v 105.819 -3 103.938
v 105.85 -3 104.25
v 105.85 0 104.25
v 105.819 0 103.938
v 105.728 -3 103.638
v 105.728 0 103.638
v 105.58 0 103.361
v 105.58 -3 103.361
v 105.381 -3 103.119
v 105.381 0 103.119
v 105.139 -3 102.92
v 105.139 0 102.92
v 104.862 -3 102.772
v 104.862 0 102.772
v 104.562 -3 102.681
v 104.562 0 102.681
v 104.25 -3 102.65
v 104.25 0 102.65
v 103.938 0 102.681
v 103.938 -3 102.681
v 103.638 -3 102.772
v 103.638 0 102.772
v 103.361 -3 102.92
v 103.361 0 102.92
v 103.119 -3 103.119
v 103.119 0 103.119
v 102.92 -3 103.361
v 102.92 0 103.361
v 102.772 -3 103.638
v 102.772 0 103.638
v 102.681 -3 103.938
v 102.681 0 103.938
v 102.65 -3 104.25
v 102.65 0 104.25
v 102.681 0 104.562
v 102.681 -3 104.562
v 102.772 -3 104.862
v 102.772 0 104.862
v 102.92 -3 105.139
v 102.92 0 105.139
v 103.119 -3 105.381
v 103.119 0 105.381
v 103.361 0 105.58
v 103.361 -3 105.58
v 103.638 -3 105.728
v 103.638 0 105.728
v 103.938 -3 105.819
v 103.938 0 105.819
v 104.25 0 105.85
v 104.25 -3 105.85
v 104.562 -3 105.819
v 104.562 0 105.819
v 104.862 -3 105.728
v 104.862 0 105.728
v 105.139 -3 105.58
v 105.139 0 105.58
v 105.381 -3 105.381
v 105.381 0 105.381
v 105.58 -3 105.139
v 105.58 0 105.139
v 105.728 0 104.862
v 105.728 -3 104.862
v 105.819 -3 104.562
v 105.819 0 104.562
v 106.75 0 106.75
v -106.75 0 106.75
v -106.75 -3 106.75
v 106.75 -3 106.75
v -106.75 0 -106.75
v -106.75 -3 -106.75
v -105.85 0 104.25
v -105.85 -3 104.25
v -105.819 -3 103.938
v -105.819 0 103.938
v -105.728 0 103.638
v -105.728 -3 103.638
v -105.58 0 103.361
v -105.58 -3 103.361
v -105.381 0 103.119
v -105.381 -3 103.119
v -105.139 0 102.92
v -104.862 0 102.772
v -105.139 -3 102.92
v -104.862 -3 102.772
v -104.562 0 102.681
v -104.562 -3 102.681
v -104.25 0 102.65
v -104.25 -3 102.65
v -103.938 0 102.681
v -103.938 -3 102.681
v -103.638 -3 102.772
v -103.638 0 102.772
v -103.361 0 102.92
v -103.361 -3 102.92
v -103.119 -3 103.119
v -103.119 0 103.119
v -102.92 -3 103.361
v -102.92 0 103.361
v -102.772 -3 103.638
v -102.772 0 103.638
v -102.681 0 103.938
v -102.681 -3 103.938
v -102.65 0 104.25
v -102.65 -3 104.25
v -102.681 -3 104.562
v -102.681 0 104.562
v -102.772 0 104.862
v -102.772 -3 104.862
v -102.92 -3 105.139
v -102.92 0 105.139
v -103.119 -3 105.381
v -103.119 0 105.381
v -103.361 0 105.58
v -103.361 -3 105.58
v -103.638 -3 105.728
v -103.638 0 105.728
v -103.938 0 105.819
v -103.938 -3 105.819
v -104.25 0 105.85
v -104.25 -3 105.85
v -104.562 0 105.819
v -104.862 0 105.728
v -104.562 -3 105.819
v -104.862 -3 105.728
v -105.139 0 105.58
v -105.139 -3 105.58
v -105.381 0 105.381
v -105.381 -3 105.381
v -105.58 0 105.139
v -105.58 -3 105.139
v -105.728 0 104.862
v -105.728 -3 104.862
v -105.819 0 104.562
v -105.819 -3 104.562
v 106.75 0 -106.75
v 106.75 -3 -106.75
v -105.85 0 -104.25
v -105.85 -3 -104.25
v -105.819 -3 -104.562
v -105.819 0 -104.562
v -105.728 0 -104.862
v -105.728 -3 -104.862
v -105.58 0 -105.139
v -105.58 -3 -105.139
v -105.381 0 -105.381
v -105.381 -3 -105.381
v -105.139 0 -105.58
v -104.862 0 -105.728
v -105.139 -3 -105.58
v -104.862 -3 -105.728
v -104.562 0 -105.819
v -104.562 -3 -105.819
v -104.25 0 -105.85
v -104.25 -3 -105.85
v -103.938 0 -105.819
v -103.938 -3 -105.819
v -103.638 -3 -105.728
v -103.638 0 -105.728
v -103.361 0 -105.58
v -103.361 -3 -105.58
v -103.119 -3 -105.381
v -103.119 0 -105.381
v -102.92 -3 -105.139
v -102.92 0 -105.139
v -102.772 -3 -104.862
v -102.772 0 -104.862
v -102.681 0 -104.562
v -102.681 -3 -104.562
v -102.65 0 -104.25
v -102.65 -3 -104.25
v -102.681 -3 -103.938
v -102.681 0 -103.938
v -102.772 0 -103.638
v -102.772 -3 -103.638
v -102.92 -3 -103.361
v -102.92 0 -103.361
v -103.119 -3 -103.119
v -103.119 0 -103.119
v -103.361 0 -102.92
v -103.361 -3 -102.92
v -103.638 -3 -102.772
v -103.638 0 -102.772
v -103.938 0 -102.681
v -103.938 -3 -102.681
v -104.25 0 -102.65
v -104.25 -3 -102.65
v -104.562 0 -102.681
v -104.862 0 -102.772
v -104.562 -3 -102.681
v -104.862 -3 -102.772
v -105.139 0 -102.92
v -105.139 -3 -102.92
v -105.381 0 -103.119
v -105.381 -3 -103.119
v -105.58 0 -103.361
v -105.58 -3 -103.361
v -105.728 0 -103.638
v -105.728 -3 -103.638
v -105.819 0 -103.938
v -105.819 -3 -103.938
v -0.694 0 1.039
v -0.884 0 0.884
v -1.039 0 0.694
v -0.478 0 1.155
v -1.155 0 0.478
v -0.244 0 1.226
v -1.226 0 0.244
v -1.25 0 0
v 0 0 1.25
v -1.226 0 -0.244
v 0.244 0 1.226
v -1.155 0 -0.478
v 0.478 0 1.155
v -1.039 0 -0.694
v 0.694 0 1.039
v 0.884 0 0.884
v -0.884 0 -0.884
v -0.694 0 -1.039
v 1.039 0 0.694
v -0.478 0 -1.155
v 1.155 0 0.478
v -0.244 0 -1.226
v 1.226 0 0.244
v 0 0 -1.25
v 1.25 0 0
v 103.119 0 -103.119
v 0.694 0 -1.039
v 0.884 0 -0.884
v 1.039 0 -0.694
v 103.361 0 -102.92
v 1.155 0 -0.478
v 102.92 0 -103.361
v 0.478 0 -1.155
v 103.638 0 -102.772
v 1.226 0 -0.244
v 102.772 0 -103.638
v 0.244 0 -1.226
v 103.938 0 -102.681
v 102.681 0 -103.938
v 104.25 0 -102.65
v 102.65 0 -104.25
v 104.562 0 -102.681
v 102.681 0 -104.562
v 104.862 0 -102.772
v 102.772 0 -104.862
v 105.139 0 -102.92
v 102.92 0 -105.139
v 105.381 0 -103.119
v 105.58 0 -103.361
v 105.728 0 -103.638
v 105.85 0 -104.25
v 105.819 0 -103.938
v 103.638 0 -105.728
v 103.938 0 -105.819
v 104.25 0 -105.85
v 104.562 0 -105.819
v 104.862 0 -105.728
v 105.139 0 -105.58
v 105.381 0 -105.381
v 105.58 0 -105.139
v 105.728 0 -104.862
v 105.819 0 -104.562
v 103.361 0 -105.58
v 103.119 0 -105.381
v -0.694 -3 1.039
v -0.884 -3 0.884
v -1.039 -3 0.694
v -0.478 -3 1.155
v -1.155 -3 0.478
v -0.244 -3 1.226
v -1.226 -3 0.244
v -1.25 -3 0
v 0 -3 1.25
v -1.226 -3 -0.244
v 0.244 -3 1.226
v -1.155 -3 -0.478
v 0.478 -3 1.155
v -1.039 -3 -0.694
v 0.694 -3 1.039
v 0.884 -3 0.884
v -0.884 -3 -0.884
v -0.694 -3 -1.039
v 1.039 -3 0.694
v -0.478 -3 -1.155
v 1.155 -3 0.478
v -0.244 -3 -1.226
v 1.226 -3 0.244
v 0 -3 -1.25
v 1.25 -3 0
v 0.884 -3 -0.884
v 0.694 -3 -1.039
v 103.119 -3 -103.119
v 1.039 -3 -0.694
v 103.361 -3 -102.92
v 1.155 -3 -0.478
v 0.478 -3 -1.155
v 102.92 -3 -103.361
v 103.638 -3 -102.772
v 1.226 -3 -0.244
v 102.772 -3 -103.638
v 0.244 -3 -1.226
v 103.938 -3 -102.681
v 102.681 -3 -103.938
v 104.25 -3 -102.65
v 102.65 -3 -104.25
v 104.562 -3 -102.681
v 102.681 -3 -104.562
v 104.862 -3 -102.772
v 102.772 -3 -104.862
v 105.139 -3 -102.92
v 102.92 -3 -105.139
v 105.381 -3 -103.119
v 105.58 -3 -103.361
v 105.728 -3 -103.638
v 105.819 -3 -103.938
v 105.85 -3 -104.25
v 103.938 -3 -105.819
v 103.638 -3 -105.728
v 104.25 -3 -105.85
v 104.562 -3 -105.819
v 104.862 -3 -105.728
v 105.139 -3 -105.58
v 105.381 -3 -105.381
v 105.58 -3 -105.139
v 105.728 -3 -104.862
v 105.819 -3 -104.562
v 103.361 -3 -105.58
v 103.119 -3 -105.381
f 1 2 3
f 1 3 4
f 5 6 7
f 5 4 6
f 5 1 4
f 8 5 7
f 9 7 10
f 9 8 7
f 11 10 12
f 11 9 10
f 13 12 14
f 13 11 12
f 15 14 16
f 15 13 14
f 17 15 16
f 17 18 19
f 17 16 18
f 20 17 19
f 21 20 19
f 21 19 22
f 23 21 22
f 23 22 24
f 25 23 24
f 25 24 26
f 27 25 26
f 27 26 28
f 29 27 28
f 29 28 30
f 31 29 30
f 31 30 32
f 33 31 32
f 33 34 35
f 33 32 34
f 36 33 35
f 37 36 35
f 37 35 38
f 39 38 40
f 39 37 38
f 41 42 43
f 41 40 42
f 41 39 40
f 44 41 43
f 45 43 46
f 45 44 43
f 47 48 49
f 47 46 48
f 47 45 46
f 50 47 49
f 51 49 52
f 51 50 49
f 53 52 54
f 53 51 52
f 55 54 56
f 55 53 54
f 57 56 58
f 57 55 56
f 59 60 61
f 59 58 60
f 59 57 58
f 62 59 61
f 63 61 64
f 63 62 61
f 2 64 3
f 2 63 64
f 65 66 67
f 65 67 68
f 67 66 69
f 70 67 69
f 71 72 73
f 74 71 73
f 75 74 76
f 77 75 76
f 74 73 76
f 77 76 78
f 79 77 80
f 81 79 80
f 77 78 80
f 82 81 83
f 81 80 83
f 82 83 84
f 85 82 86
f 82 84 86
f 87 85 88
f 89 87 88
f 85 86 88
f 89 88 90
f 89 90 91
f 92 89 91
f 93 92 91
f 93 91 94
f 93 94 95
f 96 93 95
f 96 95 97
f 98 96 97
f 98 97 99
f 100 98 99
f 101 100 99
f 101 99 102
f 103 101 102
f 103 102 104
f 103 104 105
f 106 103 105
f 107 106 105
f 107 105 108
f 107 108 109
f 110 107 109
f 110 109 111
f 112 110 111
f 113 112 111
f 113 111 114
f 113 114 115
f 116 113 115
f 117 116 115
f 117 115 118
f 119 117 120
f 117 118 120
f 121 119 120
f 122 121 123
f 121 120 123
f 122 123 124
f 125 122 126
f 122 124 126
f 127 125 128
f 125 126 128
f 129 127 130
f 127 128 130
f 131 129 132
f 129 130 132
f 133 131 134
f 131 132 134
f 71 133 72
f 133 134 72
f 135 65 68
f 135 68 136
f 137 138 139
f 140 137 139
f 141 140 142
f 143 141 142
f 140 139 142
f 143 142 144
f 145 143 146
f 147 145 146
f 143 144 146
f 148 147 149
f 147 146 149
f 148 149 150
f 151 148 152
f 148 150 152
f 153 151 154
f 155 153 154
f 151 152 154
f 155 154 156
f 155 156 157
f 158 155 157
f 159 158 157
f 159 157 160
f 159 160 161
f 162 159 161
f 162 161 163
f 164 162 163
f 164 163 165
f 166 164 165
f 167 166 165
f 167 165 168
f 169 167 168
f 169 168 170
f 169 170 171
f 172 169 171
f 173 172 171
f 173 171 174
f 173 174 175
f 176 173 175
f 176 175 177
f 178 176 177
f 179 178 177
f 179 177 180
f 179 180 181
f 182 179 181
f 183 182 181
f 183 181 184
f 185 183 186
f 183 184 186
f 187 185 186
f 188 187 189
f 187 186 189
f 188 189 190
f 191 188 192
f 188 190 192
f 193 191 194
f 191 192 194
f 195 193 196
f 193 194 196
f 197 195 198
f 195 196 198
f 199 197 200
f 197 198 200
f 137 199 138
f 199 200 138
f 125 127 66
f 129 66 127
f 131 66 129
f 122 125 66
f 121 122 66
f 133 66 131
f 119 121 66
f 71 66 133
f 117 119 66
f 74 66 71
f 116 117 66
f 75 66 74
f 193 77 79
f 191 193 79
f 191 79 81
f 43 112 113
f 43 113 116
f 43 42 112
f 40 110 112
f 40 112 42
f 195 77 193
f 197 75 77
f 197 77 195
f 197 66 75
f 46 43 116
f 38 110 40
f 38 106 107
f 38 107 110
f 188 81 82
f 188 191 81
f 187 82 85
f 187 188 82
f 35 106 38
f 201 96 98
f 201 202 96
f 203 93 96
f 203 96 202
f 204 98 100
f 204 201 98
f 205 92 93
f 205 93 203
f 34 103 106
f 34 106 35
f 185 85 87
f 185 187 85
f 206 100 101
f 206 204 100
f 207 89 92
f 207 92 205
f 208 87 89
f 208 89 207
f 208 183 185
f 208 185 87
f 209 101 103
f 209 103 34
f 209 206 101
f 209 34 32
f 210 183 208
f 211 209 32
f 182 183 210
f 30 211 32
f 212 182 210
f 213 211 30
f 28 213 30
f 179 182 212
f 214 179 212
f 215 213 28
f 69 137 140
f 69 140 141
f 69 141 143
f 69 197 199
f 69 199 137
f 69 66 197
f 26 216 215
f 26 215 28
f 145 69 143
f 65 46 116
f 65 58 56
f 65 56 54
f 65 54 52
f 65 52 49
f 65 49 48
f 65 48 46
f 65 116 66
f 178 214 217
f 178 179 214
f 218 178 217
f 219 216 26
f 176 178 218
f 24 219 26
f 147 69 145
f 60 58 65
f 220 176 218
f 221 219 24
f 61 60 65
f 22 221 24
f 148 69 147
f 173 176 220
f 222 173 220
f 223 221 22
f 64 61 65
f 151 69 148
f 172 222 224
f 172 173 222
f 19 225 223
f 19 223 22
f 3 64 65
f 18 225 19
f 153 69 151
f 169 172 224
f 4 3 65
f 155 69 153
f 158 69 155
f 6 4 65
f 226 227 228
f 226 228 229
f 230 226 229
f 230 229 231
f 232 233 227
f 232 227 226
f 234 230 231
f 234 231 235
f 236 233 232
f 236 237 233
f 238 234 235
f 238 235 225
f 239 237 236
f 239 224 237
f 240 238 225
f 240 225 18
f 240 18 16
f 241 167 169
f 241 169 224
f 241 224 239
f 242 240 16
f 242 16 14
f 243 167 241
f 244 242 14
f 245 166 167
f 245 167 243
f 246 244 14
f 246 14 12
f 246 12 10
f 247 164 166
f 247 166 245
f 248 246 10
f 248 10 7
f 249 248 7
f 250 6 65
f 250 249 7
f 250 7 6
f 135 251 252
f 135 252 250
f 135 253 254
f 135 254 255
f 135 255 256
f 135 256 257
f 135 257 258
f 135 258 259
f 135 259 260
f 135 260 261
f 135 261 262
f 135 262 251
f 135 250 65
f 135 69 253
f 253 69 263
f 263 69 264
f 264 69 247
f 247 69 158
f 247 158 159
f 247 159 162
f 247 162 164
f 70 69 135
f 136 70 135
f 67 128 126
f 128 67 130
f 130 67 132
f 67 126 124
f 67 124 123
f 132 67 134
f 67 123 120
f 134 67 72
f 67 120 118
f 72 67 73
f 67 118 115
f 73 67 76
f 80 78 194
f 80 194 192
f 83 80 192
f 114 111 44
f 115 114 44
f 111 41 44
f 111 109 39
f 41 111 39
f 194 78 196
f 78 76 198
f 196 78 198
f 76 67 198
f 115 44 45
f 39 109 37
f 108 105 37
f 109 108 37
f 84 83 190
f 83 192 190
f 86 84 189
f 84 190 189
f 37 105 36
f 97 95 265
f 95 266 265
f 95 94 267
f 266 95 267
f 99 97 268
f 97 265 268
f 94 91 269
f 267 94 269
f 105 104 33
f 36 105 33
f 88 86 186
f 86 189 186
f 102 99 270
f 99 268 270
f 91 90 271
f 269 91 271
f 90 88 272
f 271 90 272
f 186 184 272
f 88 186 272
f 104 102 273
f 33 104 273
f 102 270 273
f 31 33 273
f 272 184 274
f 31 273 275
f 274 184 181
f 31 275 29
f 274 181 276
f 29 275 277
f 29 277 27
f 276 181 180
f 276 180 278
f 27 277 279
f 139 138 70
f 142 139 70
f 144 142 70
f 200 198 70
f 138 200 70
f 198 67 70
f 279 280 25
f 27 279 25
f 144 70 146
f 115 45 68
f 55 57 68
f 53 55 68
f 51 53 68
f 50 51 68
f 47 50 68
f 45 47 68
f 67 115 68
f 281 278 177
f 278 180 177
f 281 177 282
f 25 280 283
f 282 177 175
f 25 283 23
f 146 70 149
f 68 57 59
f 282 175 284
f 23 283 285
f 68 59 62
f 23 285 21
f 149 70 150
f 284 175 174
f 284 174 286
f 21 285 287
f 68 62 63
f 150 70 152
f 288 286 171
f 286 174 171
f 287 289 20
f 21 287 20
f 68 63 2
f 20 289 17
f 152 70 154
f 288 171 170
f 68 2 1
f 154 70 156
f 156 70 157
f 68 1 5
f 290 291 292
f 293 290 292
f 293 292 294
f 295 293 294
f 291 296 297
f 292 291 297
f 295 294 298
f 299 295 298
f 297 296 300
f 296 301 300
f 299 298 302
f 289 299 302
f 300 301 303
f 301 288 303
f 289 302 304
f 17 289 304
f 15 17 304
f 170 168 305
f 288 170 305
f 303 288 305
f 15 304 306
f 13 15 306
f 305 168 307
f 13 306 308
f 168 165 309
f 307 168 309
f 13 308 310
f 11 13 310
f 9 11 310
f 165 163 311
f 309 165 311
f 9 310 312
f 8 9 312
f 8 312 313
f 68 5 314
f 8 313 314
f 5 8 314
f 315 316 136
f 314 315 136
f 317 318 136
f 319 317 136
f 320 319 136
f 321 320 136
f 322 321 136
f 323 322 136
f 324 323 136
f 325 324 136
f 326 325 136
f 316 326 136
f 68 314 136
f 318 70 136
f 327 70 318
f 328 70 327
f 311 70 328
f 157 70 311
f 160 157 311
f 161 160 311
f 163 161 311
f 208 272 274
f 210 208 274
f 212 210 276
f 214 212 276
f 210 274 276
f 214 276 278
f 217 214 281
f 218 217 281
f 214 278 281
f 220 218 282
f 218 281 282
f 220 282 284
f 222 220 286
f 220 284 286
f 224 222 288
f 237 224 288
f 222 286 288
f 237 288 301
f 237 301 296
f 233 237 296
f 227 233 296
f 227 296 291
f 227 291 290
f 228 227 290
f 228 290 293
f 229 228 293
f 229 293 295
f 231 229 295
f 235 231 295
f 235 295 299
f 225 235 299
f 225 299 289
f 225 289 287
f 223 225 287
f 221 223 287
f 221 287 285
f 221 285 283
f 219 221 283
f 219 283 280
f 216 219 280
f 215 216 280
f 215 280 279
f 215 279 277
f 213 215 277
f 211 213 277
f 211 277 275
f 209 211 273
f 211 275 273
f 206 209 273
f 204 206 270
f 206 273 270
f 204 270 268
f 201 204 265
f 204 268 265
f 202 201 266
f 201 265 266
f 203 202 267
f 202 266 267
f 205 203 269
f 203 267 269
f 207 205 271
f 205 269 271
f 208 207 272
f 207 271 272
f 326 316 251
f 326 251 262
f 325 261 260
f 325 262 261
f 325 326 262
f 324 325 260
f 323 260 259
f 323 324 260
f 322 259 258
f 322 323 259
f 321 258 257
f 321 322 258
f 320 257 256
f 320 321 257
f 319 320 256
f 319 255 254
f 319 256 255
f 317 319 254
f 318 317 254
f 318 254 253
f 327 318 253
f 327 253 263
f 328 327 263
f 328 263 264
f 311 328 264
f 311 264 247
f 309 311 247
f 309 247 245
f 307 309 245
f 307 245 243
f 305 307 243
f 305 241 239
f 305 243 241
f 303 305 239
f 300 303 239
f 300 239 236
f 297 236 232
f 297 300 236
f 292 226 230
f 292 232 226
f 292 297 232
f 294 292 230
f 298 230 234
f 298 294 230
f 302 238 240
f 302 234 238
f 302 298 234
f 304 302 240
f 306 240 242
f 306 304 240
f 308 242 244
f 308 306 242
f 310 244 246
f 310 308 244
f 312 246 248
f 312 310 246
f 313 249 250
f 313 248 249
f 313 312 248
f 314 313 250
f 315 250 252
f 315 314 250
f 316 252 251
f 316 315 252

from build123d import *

# Parameters (mm, degrees)
SKETCH1_W                       = 213.5
SKETCH1_H                       = 213.5
BASE_FLANGE1_DEPTH              = 3
F_3_0MM_CLEARANCE_DOWEL_HOLE1_D = 3.2
F_2_5MM_CLEARANCE_DOWEL_HOLE1_D = 2.5


# Sheet-metal steps are written as plain solids
with BuildPart() as part:
    # Sketch1 → Base-Flange1 (new body)
    with BuildSketch(Plane(origin=(0, 0, 0), x_dir=(1, 0, 0), z_dir=(0, 1, 0))):
        Rectangle(SKETCH1_W, SKETCH1_H)
    extrude(amount=-BASE_FLANGE1_DEPTH)

    # Ø3.0mm Clearance Dowel Hole1 (through all)
    with Locations(Plane(origin=(0, 0, 0), x_dir=(1, 0, 0), z_dir=(0, 1, 0))):
        with Locations((-104.25, 104.25), (-104.25, -104.25)):
            f_3_0mm_clearance_dowel_hole1 = Hole(F_3_0MM_CLEARANCE_DOWEL_HOLE1_D / 2)

    # Mirror2: Ø3.0mm Clearance Dowel Hole1 across plane
    add(f_3_0mm_clearance_dowel_hole1.mirror(Plane(origin=(0, 0, 0), x_dir=(0, 0, 1), z_dir=(1, 0, 0))), mode=Mode.SUBTRACT)

    # Ø2.5mm Clearance Dowel Hole1 (through all)
    with Locations(Plane(origin=(0, 0, 0), x_dir=(1, 0, 0), z_dir=(0, 1, 0))):
        with Locations((0, 0)):
            Hole(F_2_5MM_CLEARANCE_DOWEL_HOLE1_D / 2)


solid = part.part
